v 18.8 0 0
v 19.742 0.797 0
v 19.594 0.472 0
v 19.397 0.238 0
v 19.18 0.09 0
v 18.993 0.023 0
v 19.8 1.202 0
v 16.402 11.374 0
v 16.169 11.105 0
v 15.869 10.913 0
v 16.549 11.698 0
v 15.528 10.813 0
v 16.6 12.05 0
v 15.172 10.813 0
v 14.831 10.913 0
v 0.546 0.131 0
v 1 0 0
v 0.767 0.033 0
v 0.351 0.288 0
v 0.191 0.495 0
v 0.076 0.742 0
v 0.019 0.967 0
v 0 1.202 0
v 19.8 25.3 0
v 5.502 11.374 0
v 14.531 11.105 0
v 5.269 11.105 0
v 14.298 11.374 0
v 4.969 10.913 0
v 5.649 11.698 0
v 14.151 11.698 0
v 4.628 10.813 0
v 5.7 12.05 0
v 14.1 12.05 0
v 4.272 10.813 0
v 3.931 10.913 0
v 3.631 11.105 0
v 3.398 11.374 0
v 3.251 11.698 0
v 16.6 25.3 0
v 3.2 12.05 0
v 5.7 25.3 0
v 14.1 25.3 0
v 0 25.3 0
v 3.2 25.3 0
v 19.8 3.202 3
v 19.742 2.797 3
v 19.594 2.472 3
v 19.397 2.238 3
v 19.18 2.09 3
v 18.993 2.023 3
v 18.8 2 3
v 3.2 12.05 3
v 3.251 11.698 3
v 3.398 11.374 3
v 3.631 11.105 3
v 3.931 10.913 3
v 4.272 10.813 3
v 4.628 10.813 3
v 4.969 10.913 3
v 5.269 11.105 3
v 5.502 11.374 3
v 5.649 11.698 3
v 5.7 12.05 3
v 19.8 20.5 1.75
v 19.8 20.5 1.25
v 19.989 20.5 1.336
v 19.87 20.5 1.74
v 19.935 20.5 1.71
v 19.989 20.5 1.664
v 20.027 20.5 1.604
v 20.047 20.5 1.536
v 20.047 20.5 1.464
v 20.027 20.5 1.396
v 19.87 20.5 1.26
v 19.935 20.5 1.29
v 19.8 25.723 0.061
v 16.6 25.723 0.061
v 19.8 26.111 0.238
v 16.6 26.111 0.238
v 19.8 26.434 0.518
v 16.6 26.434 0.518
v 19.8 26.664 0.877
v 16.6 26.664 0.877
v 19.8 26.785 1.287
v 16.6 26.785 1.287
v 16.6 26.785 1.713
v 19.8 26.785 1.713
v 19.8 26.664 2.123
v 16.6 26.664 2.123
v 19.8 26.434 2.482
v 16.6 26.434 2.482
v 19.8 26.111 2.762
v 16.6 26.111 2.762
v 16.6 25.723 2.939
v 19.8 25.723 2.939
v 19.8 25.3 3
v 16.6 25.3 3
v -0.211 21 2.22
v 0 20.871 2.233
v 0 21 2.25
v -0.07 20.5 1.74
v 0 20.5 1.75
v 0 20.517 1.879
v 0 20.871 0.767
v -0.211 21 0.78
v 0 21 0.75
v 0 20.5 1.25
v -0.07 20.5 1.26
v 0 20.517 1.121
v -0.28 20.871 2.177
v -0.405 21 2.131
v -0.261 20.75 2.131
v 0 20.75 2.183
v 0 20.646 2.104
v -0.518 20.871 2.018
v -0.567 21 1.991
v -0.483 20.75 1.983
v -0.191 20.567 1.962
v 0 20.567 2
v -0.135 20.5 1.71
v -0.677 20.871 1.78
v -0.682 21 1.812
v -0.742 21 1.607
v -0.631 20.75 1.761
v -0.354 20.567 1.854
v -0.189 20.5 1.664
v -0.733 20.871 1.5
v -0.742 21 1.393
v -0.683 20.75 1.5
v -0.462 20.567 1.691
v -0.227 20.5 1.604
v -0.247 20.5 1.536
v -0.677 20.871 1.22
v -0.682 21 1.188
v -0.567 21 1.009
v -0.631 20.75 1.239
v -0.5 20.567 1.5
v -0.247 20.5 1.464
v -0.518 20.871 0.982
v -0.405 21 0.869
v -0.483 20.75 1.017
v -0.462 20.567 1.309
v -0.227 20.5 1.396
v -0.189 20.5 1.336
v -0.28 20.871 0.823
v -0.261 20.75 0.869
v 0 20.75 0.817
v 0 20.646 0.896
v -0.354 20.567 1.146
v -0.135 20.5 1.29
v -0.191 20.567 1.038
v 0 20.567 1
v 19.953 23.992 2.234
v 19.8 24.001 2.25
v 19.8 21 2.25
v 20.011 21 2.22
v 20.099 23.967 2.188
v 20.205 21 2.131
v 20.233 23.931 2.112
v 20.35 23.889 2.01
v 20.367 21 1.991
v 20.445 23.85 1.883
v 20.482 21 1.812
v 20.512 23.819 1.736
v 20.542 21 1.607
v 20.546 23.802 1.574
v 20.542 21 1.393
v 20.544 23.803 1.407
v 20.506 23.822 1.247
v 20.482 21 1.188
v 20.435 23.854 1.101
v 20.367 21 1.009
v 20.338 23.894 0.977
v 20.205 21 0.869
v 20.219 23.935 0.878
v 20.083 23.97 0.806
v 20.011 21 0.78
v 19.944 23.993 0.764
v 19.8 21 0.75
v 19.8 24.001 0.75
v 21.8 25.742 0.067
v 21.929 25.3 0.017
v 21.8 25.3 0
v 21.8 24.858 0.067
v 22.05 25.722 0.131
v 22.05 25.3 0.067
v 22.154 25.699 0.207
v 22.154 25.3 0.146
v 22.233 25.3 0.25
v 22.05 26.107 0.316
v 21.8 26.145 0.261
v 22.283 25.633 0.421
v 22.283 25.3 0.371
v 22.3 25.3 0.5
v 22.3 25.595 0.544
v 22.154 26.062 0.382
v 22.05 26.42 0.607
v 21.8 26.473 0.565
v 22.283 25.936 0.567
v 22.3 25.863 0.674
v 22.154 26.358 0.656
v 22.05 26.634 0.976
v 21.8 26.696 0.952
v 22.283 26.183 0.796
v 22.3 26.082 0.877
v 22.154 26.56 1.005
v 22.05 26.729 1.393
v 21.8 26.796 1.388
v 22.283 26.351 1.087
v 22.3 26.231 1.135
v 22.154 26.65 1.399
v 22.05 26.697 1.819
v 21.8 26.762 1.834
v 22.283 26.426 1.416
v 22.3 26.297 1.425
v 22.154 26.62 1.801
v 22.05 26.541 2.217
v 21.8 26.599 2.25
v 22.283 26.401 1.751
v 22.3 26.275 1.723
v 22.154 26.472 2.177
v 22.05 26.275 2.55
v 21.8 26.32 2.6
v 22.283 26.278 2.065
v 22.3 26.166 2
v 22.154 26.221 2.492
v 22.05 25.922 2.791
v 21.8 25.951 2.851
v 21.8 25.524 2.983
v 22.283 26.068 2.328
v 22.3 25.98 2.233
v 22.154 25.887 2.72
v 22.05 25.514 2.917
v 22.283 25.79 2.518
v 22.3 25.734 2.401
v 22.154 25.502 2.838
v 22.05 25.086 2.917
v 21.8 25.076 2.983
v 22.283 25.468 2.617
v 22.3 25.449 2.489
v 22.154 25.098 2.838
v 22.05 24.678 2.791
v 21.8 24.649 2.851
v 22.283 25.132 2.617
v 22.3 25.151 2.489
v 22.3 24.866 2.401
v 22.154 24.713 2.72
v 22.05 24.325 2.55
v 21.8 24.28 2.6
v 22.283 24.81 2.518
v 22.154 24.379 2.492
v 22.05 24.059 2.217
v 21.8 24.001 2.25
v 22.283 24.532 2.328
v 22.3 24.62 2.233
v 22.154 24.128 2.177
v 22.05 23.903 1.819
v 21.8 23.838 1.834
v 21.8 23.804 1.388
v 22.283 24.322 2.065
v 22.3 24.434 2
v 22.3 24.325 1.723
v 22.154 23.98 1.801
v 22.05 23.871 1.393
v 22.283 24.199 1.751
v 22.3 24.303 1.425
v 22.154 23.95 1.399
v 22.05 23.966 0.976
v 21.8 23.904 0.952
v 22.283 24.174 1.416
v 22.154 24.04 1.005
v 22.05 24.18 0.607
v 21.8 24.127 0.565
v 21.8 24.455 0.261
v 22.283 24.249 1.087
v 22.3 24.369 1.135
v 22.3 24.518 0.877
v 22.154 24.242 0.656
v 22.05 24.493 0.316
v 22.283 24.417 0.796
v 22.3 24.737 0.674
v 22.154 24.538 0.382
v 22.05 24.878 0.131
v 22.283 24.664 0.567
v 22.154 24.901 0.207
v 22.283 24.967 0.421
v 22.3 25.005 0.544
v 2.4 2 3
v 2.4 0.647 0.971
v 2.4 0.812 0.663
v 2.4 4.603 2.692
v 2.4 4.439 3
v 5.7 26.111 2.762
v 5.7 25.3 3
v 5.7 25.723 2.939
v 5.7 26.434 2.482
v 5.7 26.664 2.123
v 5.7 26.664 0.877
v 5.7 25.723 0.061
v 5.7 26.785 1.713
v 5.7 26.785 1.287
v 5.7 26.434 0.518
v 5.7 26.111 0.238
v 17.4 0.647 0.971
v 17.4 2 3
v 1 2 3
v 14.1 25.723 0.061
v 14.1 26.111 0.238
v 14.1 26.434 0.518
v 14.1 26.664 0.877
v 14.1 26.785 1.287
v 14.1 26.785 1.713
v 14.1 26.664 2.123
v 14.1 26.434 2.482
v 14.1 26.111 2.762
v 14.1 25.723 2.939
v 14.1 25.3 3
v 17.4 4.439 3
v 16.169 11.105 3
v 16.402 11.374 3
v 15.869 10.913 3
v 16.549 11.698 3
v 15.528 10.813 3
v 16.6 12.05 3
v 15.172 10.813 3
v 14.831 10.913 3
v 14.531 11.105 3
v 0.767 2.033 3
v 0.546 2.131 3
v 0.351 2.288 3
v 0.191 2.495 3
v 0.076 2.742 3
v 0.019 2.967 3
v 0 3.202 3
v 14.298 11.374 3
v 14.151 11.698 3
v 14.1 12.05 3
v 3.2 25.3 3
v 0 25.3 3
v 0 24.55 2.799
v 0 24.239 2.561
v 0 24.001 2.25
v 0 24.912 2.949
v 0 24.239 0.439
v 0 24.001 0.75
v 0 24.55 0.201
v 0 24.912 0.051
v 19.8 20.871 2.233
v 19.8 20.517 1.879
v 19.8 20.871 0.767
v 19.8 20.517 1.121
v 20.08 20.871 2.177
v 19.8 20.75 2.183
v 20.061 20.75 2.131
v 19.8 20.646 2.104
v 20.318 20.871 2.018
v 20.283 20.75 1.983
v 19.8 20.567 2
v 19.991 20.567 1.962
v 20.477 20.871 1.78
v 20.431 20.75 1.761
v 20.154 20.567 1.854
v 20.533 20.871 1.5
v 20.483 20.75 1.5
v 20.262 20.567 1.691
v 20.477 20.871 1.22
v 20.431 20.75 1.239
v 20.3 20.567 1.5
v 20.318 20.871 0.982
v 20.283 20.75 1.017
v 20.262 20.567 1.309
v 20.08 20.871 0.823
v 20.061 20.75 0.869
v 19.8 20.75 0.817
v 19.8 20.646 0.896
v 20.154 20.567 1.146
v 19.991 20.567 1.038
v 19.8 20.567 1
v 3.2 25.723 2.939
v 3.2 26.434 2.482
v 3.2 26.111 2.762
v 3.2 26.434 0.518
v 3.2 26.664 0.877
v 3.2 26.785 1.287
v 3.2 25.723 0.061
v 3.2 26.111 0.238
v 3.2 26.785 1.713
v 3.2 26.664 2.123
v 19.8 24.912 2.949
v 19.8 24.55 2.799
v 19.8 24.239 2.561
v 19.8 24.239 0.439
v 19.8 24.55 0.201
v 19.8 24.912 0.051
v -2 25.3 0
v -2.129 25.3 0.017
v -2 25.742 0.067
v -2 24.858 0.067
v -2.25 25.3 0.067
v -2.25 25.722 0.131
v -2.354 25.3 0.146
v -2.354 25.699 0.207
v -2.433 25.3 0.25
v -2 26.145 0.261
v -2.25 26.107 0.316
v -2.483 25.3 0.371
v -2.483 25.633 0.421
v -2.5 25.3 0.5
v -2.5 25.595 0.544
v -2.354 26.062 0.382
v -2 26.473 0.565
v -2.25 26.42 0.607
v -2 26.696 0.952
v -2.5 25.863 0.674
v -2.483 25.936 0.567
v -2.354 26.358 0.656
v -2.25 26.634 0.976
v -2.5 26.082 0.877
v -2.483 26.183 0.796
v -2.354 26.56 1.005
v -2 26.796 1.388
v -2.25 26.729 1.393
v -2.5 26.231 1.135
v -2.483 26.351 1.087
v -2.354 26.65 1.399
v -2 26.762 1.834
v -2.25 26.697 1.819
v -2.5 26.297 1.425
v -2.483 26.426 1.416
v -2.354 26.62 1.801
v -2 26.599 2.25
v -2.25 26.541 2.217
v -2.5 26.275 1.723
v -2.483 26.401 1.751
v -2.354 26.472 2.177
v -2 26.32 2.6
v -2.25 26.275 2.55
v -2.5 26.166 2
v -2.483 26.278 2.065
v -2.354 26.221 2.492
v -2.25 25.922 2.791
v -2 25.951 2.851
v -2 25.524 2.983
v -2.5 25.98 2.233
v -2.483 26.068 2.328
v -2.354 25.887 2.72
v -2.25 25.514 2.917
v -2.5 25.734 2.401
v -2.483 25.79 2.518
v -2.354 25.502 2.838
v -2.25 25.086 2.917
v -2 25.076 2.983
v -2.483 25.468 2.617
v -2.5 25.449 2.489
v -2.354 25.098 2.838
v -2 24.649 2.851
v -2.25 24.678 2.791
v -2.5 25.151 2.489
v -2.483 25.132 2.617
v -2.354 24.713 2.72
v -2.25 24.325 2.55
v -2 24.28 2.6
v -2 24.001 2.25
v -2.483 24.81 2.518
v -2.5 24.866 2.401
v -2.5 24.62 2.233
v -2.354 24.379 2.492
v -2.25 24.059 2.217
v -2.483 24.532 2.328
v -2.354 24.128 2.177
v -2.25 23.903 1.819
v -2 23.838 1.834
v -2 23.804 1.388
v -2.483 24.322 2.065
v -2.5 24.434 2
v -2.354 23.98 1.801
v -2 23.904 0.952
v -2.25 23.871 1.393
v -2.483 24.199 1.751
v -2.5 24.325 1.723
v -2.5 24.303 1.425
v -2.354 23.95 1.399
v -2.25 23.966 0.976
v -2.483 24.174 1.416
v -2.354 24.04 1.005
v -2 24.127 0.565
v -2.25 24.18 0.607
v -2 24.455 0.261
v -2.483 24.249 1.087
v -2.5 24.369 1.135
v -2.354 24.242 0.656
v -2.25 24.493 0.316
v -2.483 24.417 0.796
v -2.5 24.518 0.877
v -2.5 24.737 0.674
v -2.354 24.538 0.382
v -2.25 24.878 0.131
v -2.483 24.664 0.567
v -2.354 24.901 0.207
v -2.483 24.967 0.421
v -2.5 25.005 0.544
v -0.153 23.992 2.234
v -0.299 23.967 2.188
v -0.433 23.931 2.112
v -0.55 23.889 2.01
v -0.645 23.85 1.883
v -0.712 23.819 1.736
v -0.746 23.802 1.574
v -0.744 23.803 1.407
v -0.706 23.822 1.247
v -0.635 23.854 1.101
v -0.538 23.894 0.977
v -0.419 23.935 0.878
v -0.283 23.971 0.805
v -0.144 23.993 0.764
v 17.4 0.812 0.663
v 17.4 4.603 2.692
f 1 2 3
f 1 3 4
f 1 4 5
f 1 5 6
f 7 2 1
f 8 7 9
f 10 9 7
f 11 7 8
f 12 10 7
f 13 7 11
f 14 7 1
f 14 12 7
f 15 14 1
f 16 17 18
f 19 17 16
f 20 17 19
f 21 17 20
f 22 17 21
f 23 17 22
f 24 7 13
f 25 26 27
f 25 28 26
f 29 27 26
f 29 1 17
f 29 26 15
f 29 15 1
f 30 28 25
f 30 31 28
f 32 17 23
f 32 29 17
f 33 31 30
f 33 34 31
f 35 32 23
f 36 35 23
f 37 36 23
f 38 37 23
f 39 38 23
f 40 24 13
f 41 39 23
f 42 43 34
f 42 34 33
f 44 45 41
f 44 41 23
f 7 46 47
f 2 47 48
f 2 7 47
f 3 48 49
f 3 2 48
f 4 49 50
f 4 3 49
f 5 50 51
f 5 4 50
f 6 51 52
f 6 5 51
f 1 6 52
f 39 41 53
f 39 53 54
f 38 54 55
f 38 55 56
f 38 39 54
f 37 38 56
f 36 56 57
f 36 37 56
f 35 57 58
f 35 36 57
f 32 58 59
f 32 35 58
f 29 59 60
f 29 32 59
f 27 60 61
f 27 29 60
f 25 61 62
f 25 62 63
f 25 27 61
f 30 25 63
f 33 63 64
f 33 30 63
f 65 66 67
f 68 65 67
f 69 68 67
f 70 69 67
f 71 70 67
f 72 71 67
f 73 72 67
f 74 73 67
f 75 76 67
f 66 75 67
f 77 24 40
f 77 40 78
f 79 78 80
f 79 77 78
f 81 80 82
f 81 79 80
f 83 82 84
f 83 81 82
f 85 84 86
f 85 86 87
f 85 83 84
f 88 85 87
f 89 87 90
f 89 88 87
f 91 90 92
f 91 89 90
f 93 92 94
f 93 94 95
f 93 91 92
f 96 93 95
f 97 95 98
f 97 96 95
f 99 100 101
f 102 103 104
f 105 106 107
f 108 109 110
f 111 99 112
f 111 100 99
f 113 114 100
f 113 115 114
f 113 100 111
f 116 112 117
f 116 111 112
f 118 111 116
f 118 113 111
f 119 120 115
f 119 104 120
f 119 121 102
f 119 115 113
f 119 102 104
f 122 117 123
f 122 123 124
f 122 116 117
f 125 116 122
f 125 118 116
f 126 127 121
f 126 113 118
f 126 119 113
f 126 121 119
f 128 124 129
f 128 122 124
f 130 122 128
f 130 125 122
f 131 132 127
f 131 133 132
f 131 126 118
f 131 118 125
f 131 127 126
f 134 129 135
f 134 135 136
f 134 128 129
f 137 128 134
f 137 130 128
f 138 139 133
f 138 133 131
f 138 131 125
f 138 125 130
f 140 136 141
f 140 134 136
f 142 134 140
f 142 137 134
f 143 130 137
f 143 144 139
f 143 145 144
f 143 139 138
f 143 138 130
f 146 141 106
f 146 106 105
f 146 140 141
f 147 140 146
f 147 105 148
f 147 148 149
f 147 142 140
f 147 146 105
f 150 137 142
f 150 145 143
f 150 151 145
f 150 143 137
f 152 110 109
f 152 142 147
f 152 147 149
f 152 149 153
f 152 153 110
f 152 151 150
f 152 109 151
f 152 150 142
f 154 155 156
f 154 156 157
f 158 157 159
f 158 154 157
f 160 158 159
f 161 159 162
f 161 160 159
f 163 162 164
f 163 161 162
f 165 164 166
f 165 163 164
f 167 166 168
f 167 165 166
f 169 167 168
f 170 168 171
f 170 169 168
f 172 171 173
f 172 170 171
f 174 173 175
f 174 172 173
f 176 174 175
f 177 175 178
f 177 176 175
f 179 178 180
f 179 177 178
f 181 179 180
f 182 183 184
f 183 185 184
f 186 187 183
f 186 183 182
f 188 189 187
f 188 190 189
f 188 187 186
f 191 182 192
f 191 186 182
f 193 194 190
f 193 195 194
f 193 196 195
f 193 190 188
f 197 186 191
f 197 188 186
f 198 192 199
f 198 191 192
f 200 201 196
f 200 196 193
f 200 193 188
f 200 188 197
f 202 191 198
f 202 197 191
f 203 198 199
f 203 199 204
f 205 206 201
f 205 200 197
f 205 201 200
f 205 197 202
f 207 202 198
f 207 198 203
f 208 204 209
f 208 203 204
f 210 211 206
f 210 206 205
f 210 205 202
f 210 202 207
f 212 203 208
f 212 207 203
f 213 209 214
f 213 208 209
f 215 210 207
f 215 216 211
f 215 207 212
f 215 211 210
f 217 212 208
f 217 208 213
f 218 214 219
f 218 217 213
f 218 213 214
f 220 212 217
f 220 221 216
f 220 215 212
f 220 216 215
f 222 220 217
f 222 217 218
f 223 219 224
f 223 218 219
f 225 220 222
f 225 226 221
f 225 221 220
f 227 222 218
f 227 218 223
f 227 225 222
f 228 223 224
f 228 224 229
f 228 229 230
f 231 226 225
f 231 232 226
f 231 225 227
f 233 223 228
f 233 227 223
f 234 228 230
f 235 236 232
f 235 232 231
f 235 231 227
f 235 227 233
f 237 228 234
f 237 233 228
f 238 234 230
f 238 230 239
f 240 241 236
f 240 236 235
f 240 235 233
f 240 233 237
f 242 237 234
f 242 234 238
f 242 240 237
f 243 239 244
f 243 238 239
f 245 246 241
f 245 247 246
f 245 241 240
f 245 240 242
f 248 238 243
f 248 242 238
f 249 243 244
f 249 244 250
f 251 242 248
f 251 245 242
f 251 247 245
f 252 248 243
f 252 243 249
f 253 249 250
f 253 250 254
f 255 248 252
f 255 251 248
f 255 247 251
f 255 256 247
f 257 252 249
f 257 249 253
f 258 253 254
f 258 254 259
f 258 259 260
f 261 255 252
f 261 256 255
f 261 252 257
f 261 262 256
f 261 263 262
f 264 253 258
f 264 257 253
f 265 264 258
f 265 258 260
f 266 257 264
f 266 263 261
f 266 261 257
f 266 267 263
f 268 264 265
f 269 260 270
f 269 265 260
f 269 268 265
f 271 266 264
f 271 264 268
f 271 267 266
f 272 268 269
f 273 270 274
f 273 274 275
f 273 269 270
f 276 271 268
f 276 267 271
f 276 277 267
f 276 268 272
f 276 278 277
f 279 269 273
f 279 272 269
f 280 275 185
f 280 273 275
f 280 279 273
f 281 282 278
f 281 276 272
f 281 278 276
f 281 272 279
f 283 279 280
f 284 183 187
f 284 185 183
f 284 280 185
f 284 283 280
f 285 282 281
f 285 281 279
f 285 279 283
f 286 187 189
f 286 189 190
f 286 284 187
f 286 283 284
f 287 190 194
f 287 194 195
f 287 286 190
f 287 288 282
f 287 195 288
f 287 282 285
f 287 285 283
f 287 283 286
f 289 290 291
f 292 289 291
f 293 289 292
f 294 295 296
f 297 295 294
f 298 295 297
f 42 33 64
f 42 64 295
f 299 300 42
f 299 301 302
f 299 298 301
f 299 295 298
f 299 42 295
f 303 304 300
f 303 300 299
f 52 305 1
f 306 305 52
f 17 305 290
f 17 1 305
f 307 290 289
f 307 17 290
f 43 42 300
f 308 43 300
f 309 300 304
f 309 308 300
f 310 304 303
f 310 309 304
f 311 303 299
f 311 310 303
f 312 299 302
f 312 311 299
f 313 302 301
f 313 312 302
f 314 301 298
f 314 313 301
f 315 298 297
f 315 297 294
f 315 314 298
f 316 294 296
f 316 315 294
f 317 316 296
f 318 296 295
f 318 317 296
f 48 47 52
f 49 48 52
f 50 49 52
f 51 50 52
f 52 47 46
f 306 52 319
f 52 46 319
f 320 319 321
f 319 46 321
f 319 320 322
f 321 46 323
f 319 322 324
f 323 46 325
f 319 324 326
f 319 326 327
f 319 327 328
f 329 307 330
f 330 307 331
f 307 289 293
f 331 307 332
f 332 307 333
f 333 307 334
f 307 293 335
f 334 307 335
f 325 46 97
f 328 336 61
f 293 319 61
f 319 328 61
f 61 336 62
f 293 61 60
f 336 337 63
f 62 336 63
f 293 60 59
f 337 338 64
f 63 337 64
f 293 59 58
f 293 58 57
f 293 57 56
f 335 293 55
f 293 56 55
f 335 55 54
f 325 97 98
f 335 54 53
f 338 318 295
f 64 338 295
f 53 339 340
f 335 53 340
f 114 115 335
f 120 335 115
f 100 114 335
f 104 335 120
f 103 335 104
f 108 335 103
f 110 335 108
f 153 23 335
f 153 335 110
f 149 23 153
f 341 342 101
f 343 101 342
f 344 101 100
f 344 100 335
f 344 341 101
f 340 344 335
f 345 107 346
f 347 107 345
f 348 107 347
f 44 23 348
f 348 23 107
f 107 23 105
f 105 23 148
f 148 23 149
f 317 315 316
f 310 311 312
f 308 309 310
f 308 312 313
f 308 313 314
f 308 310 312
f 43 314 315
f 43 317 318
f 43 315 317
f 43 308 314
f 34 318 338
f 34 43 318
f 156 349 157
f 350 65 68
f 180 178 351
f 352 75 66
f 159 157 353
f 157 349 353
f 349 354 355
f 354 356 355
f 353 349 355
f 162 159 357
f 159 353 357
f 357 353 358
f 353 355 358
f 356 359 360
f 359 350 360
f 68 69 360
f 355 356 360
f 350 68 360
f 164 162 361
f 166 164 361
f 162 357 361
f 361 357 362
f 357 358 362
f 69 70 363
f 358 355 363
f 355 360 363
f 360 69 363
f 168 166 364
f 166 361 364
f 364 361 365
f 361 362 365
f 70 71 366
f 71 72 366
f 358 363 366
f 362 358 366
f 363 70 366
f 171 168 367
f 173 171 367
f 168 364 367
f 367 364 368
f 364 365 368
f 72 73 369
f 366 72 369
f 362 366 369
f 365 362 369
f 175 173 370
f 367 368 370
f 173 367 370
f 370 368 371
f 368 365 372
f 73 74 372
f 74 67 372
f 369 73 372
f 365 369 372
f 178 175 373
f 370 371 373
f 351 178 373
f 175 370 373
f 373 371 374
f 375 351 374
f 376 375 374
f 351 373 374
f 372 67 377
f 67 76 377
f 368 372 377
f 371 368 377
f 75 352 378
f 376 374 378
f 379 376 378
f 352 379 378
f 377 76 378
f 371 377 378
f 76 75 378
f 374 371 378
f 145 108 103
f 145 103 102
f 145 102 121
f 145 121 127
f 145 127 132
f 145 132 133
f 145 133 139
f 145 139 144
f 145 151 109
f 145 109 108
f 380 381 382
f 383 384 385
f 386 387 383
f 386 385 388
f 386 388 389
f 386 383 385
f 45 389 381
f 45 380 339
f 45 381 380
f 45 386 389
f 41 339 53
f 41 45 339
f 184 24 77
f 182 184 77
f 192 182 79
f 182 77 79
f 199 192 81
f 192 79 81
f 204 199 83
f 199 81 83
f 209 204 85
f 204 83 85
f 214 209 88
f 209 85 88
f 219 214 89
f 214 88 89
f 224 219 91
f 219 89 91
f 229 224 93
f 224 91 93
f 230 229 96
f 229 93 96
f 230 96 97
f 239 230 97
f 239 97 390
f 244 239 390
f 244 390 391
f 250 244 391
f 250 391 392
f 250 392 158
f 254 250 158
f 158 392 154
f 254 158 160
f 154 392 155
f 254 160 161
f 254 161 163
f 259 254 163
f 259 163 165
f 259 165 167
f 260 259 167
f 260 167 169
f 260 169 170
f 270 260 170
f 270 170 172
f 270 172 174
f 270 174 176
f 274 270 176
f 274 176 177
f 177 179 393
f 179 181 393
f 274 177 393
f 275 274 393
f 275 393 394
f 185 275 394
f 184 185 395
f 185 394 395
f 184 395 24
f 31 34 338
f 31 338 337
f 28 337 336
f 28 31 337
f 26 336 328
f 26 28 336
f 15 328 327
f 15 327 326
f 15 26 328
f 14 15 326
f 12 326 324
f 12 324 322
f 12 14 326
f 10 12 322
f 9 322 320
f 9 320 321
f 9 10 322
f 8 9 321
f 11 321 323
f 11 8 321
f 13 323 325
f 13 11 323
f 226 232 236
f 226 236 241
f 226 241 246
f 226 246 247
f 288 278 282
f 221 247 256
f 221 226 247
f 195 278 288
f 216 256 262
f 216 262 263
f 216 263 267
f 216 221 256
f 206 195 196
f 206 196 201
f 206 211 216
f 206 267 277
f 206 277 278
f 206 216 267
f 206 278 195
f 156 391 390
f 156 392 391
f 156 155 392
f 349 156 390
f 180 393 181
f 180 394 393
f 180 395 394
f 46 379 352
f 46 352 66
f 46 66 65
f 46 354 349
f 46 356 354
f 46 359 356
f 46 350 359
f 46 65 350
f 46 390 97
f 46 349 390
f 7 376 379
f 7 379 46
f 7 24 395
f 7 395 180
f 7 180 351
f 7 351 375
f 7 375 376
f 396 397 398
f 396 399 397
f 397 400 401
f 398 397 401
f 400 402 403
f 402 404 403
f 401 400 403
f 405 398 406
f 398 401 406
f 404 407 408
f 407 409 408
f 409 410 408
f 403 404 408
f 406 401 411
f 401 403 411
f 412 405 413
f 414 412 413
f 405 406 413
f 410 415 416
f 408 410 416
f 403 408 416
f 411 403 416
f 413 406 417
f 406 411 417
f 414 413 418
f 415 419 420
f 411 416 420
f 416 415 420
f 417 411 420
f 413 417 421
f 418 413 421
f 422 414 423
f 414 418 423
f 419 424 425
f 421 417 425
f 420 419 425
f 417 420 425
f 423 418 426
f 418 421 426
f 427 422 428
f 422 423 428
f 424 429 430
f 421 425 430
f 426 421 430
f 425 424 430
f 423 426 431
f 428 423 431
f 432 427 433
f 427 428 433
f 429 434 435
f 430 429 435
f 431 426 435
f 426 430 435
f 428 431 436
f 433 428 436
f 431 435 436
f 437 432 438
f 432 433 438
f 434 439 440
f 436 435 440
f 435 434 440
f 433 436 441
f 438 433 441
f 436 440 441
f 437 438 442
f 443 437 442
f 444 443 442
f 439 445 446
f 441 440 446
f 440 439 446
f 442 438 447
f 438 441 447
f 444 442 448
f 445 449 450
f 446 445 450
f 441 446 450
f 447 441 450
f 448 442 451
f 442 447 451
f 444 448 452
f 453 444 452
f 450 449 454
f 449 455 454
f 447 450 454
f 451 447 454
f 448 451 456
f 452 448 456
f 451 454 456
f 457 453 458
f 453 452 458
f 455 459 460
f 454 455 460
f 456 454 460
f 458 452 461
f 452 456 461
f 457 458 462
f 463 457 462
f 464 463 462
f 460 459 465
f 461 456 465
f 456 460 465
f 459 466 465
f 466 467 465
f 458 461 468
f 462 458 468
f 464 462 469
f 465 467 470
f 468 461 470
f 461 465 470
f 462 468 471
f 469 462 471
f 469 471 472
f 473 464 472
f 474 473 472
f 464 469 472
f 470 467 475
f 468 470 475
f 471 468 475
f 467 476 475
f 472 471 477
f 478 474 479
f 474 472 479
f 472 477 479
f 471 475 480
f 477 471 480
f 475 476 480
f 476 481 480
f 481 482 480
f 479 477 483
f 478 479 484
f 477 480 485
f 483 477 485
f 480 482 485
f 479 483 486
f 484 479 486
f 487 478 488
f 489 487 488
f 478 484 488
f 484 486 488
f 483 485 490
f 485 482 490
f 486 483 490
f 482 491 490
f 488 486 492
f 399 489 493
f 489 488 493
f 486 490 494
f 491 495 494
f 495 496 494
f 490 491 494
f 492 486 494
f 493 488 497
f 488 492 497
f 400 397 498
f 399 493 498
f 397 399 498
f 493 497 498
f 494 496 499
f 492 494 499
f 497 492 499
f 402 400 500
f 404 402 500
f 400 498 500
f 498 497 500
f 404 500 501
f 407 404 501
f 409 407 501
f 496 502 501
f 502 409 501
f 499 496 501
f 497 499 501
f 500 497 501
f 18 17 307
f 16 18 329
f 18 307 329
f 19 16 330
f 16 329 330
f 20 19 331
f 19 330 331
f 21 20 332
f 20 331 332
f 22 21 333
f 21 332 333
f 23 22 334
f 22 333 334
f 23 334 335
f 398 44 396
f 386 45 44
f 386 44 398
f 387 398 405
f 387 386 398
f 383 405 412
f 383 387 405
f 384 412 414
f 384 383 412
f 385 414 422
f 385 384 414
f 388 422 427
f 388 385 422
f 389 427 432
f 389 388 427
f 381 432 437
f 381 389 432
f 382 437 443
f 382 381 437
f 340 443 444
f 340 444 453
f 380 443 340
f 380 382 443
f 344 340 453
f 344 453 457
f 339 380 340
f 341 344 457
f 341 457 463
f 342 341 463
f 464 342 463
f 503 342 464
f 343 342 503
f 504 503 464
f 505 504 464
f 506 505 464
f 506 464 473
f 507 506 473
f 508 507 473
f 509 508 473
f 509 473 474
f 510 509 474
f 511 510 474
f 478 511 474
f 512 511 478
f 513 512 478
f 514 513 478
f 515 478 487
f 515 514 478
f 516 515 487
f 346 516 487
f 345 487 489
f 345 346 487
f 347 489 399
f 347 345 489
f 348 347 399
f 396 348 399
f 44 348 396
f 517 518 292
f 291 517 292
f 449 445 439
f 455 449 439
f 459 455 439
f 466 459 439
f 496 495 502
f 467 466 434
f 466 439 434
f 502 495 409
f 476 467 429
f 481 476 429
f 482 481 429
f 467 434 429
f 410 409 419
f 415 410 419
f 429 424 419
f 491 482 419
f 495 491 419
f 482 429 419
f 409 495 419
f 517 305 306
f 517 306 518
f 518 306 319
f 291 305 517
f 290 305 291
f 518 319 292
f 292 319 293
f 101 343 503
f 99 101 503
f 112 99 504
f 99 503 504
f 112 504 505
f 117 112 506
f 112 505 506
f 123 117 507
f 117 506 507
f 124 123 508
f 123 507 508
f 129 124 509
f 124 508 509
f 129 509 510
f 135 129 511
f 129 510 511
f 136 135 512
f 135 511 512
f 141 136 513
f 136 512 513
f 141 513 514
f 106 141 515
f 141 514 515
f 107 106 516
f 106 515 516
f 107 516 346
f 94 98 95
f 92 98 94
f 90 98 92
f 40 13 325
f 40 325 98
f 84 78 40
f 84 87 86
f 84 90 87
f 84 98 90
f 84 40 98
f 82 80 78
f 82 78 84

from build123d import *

# Parameters (mm, degrees)
BOSS_EXTRUDE1_DEPTH      = 3
SKETCH2_R                = 1.5
BOSS_EXTRUDE2_DEPTH      = 2.5
BOSS_EXTRUDE2_DEPTH_BACK = 22.3
SKETCH3_W                = 2.5
SKETCH3_H                = 20.733799839
CUT_EXTRUDE1_DEPTH       = 4
CUT_EXTRUDE1_DEPTH_BACK  = 1
BOSS_EXTRUDE3_START      = -0.5
BOSS_EXTRUDE3_DEPTH      = 5.8
FILLET1_R                = 0.5
FILLET1_OF_MIRROR1_R     = 0.5
CUT_EXTRUDE2_DEPTH       = 23.3000001
SKETCH8_W                = 15
SKETCH8_H                = 4.3
CUT_EXTRUDE3_DEPTH       = 1.5
FILLET2_R                = 0.5
FILLET3_R                = 1


with BuildPart() as part:
    # Sketch1 → Boss-Extrude1 (new body)
    with BuildSketch(Plane.XY):
        with BuildLine():
            Line((3.2, 25.3), (3.2, 12.05))
            ThreePointArc((3.2, 12.05), (4.45, 10.8), (5.7, 12.05))
            Line((5.7, 12.05), (5.7, 25.3))
            Line((5.7, 25.3), (14.1, 25.3))
            Line((14.1, 25.3), (14.1, 12.05))
            ThreePointArc((14.1, 12.05), (15.35, 10.8), (16.6, 12.05))
            Line((16.6, 12.05), (16.6, 25.3))
            Line((16.6, 25.3), (19.8, 25.3))
            Line((19.8, 25.3), (19.8, 0))
            Line((19.8, 0), (0, 0))
            Line((0, 0), (0, 25.3))
            Line((0, 25.3), (3.2, 25.3))
        make_face()
    extrude(amount=BOSS_EXTRUDE1_DEPTH)

    # Sketch2 → Boss-Extrude2 (add, two sides)
    with BuildSketch(Plane(origin=(19.8, 0, 0), x_dir=(0, 0, -1), z_dir=(1, 0, 0))) as boss_extrude2_sk:
        with Locations((-1.5, 25.3)):
            Circle(SKETCH2_R)
    extrude(amount=BOSS_EXTRUDE2_DEPTH)
    extrude(boss_extrude2_sk.sketch, amount=-BOSS_EXTRUDE2_DEPTH_BACK)

    # Sketch3 → Cut-Extrude1 (cut, two sides)
    with BuildSketch(Plane.XY) as cut_extrude1_sk:
        with Locations((4.45, 22.41689992)):
            Rectangle(SKETCH3_W, SKETCH3_H)
        with Locations((15.35, 22.41689992)):
            Rectangle(SKETCH3_W, SKETCH3_H)
    extrude(amount=CUT_EXTRUDE1_DEPTH, mode=Mode.SUBTRACT)
    extrude(cut_extrude1_sk.sketch, amount=-CUT_EXTRUDE1_DEPTH_BACK, mode=Mode.SUBTRACT)

    # Sketch5 → Boss-Extrude3 (add)
    with BuildSketch(Plane(origin=(0, 26.8, 0), x_dir=(1, 0, 0), z_dir=(0, 1, 0)).offset(BOSS_EXTRUDE3_START)):
        with BuildLine():
            Line((0, -0.75), (0, -2.25))
            ThreePointArc((0, -2.25), (-0.75, -1.5), (0, -0.75))
        make_face()
    boss_extrude3 = extrude(amount=-BOSS_EXTRUDE3_DEPTH)

    # Fillet1
    fillet1_edges = [part.edges().sort_by_distance(p)[0] for p in [
        (-0.75, 20.5, 1.5),
    ]]
    fillet(fillet1_edges, radius=FILLET1_R)

    # Mirror1: Boss-Extrude3 across plane
    add(boss_extrude3.mirror(Plane.ZY.offset(-9.9)))

    # Fillet1 of Mirror1
    fillet1_of_mirror1_edges = [part.edges().sort_by_distance(p)[0] for p in [
        (20.55, 20.5, 1.5),
    ]]
    fillet(fillet1_of_mirror1_edges, radius=FILLET1_OF_MIRROR1_R)

    # Sketch6 → Cut-Extrude2 (cut, through all)
    with BuildSketch(Plane.ZY):
        Polygon((0, 0), (3, 2), (3, -2.592158126), (0, -2.592158126), align=None)
    extrude(amount=-CUT_EXTRUDE2_DEPTH, mode=Mode.SUBTRACT)

    # Sketch8 → Cut-Extrude3 (cut)
    with BuildSketch(Plane(origin=(0, -0.802775638, 1.499997875), x_dir=(-1, 0, 0), z_dir=(0, 0.471858445, -0.881674321))):
        with Locations((-9.9, 3.178923977)):
            Rectangle(SKETCH8_W, SKETCH8_H)
    extrude(amount=CUT_EXTRUDE3_DEPTH, mode=Mode.SUBTRACT)

    # Fillet2
    fillet2_edges = [part.edges().sort_by_distance(p)[0] for p in [
        (-2.5, 25.3, 3),
        (22.3, 25.3, 3),
    ]]
    fillet(fillet2_edges, radius=FILLET2_R)

    # Fillet3
    fillet3_edges = [part.edges().sort_by_distance(p)[0] for p in [
        (19.8, 1, 1.5),
        (0, 1, 1.5),
    ]]
    fillet(fillet3_edges, radius=FILLET3_R)


solid = part.part
